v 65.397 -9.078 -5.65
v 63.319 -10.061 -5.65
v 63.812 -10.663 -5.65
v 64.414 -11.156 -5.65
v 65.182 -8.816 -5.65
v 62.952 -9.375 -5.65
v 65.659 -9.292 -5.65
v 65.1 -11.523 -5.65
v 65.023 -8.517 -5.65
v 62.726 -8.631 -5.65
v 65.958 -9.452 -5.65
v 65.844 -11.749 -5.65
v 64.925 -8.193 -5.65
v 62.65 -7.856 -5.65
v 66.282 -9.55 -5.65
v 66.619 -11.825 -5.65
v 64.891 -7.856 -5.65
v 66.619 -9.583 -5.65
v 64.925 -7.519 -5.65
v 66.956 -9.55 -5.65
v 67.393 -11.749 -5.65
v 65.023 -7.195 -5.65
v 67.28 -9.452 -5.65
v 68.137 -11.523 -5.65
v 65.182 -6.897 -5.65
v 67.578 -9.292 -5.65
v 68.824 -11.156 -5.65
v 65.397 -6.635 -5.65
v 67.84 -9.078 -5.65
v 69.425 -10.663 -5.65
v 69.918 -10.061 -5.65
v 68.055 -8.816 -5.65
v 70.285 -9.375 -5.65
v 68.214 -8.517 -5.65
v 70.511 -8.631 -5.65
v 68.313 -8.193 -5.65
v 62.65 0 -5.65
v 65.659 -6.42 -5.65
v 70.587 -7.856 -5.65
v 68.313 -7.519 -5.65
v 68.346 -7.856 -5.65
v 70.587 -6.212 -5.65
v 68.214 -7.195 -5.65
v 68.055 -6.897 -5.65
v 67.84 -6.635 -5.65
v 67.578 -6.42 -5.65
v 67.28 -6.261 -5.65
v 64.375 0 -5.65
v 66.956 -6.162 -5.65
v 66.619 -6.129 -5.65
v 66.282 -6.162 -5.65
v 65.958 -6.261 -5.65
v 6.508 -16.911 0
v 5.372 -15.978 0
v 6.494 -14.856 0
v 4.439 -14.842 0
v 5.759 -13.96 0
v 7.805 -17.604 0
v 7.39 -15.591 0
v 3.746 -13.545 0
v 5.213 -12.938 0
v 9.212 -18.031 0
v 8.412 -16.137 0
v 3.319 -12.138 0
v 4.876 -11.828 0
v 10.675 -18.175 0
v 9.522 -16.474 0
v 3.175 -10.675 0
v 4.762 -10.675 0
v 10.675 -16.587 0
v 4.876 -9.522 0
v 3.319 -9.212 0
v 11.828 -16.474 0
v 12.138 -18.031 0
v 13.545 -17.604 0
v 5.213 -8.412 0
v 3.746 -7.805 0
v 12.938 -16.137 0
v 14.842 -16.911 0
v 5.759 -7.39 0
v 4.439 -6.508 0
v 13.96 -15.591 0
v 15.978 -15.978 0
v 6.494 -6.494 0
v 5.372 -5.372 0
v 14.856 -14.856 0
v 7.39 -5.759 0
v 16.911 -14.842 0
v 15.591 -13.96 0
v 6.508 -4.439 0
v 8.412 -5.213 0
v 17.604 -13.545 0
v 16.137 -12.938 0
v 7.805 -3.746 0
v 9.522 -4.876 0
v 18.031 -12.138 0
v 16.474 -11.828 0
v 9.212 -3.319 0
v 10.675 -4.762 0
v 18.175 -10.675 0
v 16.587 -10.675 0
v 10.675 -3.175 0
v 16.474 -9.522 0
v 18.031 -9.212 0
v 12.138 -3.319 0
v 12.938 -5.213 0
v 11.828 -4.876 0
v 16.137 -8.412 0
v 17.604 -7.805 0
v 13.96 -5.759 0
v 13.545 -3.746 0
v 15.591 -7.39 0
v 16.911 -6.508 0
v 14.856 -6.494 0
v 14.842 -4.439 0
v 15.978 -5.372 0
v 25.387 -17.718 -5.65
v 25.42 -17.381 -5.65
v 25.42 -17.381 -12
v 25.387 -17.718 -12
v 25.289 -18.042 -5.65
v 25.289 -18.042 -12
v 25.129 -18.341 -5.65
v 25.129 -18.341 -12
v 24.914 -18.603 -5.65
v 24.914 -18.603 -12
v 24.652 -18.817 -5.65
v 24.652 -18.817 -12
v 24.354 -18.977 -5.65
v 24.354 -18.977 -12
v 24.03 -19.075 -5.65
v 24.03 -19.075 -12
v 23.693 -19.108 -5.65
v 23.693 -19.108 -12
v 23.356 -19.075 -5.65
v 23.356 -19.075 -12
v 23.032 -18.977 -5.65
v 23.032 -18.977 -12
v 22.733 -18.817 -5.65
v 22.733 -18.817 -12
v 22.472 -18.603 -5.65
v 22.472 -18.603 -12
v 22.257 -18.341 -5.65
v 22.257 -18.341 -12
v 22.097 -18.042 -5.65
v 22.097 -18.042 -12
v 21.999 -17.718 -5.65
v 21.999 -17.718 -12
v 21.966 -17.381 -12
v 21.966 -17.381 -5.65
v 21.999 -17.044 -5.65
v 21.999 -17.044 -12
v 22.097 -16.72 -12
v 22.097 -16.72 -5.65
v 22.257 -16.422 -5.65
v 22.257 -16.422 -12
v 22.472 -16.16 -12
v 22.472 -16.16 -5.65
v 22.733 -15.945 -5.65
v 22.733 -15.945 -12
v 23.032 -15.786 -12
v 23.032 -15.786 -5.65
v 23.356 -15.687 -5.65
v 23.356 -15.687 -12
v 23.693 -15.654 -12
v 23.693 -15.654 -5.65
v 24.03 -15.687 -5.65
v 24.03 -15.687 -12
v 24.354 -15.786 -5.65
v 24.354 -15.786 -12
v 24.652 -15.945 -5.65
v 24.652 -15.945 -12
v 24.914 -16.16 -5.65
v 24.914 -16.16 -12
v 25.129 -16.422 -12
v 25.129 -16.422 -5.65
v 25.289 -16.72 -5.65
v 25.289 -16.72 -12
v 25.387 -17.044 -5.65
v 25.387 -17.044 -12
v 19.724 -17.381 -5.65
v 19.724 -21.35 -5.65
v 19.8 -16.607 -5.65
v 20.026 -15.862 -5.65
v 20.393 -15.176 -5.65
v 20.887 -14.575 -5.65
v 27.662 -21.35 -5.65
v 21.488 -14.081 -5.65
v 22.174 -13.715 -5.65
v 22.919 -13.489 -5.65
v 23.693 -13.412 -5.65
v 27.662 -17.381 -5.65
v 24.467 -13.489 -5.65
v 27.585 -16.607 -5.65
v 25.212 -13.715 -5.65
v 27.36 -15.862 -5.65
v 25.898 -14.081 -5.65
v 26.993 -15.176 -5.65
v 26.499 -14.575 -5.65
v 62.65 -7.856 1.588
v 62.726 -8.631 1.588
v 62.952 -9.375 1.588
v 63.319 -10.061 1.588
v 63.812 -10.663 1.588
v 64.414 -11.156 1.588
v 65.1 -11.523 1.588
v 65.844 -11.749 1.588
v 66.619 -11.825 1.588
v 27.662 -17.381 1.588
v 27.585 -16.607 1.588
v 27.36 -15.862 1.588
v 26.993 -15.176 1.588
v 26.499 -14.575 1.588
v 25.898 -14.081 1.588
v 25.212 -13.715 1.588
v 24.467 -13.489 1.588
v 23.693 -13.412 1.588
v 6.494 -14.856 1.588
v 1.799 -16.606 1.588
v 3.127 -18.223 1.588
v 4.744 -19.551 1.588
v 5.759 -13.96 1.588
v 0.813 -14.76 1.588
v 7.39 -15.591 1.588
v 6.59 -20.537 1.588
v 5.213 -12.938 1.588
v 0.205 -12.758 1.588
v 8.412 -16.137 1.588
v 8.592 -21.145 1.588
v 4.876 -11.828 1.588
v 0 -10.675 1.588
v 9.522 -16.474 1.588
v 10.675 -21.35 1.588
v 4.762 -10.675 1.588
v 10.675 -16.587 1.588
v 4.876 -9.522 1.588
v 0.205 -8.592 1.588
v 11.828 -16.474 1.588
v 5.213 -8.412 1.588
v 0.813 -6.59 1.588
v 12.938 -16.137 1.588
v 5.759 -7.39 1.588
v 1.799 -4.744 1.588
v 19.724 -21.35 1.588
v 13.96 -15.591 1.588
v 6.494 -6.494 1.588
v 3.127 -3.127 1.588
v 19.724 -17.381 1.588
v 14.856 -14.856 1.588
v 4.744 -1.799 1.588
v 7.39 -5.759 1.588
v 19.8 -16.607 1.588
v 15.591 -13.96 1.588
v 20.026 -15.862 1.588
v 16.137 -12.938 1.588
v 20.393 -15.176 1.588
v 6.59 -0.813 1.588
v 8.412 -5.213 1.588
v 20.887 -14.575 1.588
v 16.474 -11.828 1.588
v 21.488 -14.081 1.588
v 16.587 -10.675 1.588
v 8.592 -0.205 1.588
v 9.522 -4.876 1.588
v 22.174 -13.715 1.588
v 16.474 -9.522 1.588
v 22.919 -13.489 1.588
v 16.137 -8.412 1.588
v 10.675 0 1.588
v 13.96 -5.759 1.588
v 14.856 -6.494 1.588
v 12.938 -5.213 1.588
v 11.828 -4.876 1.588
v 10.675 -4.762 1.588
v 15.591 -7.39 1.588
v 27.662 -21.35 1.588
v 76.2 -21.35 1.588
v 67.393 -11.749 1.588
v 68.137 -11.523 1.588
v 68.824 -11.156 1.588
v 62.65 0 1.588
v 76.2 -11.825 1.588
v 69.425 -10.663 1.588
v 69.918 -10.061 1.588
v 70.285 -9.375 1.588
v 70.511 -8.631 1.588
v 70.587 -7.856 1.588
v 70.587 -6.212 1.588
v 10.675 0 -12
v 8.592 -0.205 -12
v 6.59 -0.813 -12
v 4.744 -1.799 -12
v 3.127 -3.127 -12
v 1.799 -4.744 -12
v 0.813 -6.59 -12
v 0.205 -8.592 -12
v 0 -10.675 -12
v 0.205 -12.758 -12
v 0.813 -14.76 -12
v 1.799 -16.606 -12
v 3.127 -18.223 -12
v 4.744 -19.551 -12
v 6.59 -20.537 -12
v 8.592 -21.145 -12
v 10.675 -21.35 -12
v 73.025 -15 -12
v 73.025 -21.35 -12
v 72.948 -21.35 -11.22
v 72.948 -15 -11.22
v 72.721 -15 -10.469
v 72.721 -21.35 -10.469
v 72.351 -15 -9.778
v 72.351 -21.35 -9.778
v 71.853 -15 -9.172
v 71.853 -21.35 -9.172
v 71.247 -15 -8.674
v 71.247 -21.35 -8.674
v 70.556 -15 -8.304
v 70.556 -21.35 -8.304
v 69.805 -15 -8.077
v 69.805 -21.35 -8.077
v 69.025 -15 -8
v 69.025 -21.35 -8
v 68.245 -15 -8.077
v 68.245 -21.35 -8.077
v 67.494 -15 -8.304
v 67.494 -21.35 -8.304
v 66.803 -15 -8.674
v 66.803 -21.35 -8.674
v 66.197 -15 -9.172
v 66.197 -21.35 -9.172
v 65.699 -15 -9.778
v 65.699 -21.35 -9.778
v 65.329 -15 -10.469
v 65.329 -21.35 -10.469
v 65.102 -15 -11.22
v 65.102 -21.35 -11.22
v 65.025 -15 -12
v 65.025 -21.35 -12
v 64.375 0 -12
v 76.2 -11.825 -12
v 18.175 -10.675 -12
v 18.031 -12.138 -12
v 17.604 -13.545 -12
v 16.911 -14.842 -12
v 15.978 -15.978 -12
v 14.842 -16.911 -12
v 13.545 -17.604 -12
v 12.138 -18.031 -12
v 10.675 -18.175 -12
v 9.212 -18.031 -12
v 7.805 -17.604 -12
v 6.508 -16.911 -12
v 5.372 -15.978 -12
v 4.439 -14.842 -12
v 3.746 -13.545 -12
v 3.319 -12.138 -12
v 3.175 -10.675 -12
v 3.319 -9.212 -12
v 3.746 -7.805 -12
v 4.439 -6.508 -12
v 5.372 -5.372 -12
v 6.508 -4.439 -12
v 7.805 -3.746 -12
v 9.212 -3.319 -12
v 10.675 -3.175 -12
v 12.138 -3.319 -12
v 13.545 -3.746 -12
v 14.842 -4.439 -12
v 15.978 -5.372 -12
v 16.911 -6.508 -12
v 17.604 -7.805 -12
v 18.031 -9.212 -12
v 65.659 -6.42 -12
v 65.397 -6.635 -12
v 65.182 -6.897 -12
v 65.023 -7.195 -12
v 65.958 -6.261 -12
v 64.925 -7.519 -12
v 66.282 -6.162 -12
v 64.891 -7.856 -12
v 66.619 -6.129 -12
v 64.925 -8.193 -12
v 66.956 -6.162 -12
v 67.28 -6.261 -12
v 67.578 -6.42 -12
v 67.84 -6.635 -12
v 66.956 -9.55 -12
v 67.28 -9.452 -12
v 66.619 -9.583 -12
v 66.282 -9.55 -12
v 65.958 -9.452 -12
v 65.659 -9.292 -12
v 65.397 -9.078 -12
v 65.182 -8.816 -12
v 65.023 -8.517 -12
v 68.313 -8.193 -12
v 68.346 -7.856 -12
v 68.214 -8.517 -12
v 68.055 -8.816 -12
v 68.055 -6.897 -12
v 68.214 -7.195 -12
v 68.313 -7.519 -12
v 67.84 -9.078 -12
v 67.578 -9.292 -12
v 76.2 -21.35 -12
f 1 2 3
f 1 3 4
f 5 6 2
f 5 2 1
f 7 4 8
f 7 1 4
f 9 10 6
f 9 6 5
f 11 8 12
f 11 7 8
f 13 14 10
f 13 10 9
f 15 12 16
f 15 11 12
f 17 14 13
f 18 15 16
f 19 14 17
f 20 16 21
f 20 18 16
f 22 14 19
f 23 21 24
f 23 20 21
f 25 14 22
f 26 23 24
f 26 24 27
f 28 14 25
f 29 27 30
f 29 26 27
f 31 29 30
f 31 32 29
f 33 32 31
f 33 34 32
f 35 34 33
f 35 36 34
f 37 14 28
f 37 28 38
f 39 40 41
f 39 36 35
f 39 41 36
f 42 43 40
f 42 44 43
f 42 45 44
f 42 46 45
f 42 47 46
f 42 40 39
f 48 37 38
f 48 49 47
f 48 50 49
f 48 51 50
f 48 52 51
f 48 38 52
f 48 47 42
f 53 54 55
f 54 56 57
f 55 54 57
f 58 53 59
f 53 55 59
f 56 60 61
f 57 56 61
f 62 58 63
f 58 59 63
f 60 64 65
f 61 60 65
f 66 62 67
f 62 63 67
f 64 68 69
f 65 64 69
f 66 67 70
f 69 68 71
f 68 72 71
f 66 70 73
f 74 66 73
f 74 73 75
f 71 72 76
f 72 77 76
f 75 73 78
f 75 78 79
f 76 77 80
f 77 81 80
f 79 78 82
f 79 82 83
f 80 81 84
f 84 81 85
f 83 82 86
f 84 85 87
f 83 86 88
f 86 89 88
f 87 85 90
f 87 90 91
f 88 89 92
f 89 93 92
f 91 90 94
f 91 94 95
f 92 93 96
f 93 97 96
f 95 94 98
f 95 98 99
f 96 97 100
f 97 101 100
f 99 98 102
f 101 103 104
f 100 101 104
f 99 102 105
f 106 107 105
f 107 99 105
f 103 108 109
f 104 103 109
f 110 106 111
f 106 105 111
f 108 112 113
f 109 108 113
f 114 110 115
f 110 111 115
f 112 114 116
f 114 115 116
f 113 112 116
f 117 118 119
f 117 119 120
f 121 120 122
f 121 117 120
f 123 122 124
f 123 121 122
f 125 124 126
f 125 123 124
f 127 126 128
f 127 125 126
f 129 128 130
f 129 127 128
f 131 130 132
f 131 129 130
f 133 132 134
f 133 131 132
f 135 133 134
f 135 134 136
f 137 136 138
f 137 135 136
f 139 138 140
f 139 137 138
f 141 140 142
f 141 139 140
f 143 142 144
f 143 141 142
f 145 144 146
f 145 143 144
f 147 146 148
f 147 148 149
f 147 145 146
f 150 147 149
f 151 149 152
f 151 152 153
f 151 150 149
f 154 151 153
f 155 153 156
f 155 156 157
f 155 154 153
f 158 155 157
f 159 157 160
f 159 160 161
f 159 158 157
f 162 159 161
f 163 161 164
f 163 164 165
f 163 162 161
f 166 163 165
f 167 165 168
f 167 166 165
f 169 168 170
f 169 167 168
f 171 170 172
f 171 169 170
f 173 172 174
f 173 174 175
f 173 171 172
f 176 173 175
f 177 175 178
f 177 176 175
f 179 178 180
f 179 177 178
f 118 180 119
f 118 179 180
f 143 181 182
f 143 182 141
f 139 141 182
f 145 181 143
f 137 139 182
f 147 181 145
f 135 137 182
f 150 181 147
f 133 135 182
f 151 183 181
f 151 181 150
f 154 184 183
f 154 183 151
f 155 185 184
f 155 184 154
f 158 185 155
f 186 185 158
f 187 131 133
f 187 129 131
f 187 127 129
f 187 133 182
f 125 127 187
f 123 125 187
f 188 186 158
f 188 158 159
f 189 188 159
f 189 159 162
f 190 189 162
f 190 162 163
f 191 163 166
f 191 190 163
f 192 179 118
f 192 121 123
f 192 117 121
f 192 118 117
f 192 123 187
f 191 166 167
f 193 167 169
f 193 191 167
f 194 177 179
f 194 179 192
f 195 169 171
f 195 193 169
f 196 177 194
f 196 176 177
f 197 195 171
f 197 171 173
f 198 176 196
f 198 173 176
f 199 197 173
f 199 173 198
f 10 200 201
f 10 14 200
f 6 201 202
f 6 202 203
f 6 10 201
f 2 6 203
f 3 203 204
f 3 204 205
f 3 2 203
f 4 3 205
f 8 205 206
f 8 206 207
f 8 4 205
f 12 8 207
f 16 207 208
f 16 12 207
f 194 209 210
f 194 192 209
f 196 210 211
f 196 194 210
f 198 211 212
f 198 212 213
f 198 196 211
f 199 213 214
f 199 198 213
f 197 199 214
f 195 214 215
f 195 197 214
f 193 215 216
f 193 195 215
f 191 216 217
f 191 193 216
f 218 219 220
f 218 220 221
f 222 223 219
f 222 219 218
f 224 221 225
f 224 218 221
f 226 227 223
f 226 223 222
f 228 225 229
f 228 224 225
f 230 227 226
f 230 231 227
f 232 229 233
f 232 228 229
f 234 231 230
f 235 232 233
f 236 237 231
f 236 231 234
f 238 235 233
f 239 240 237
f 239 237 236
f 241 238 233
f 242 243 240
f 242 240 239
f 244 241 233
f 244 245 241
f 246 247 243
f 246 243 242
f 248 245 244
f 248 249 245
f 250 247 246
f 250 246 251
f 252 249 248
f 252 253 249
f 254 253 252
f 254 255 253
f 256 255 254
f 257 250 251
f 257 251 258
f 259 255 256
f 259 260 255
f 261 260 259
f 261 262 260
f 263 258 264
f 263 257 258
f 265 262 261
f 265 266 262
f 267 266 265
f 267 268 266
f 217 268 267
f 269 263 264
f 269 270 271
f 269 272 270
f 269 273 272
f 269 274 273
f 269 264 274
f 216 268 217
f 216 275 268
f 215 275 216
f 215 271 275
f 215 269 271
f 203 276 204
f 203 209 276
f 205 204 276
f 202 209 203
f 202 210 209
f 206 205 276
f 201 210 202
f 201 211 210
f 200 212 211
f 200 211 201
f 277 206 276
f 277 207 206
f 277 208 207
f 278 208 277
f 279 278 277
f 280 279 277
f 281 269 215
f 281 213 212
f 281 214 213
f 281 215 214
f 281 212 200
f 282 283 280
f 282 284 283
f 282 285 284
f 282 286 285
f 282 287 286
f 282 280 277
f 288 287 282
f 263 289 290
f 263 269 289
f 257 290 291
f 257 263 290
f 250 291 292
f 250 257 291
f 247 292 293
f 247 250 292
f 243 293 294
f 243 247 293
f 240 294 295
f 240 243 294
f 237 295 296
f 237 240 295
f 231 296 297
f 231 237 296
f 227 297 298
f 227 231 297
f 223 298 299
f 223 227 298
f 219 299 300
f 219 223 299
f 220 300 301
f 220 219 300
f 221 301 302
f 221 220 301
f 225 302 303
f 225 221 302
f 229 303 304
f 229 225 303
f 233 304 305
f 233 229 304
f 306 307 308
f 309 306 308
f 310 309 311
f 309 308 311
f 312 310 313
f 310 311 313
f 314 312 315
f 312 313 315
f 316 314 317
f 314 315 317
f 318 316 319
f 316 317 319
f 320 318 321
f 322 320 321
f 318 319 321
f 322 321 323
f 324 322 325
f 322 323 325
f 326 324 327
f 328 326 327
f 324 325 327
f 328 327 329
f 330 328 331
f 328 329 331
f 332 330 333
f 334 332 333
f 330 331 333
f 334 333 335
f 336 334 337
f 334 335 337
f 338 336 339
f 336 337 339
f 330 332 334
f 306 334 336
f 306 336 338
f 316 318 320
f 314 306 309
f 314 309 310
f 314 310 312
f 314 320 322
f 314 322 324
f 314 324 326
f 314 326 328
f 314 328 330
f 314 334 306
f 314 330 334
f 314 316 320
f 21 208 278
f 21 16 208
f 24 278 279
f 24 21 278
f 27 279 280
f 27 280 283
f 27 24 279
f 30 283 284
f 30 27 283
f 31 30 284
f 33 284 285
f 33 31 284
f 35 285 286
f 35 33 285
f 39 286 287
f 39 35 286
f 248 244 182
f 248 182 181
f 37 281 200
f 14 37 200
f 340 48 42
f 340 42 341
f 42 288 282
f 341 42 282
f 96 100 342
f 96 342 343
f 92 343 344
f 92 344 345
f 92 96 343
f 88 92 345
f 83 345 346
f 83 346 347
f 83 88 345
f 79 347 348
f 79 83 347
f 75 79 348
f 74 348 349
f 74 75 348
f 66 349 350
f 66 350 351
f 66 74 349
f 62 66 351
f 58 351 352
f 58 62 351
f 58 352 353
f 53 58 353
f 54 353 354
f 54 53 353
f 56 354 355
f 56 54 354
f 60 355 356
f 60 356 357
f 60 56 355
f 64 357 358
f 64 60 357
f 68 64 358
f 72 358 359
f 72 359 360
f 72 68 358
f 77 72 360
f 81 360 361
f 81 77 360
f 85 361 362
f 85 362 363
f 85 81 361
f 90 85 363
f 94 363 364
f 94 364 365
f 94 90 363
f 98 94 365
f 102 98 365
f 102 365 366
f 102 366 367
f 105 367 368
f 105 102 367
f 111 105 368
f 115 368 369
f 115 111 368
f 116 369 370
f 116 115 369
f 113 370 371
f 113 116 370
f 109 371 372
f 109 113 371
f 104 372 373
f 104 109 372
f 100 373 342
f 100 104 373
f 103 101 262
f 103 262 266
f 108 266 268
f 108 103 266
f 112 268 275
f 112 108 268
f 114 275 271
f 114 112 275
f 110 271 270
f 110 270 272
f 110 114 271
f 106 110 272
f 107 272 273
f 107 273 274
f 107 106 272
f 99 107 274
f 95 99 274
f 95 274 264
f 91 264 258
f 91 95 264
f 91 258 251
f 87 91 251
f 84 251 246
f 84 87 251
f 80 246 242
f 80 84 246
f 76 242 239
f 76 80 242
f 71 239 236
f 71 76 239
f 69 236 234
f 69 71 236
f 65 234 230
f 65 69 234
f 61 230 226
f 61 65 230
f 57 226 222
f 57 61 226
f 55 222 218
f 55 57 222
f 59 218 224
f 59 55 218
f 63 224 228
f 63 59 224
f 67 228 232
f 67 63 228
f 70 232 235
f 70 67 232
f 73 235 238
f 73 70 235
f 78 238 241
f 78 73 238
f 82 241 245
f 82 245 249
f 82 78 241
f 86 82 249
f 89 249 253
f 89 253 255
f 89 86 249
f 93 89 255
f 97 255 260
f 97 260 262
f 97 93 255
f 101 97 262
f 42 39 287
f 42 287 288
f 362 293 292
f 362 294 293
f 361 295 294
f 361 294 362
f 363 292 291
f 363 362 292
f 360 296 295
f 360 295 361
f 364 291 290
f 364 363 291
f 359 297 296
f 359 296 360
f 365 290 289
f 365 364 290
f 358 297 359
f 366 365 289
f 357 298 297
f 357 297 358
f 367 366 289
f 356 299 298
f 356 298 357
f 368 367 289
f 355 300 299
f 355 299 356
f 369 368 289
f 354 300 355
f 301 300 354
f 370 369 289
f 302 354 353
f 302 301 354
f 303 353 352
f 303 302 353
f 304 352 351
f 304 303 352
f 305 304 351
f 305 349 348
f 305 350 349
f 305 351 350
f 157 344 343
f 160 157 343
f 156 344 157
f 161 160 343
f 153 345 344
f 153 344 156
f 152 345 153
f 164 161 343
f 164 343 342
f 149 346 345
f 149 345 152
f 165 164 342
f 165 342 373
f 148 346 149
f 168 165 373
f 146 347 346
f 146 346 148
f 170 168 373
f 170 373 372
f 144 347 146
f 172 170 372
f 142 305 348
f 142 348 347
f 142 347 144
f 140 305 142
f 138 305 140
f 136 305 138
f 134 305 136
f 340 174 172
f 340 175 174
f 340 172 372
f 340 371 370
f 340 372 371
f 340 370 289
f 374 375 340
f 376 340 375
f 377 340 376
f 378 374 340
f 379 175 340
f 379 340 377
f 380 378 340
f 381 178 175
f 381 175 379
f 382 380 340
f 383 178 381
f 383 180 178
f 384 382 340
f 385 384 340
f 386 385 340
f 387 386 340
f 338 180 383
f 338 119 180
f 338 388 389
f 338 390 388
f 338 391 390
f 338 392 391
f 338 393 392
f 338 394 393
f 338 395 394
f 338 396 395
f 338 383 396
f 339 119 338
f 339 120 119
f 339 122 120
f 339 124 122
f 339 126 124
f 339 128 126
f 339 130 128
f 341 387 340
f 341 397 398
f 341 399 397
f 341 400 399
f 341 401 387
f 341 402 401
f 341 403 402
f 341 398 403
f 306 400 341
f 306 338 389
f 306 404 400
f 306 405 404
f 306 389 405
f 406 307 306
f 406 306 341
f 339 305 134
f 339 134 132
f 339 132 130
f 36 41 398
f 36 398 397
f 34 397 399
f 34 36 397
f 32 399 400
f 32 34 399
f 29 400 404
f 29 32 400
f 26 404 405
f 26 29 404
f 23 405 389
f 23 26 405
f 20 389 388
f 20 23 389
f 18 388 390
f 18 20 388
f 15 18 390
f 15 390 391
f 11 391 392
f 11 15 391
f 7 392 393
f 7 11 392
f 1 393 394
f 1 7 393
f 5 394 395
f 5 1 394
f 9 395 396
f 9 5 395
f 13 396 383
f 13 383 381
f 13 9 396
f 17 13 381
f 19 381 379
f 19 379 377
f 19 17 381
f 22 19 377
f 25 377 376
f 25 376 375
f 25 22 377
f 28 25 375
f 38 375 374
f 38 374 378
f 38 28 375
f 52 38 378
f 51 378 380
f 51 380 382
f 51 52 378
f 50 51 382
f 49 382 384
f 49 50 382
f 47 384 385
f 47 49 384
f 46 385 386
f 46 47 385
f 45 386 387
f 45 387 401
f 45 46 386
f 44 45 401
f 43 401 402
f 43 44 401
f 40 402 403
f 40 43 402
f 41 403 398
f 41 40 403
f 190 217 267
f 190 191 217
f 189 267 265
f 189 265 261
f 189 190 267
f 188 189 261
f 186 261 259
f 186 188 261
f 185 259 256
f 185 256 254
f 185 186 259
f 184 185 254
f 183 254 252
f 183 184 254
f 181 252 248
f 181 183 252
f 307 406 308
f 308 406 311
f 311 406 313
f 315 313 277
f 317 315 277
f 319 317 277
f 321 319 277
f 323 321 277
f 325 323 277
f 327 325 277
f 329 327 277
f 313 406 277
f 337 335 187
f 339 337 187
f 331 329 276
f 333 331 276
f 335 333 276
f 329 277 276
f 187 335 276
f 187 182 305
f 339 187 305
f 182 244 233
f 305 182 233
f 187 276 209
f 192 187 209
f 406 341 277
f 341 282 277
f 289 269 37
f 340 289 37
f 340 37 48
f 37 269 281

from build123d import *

# Parameters (mm, degrees)
F0_R     = 1.7272
F0_R_2   = 5.9124977
F1_DEPTH = 1.5875
F2_R     = 1.7272
F2_R_2   = 7.5
F3_DEPTH = 12
F5_DEPTH = 6.35
F6_R     = 10.674988
F7_W     = 7.9375
F7_H     = 7.9375
F8_DEPTH = 7.2375014
F9_R     = 3.96874


# Not quite as in the source:
# - a fillet or chamfer is up to 0.001 mm smaller than in the source, because OpenCascade refuses the exact size


with BuildPart() as f1:
    # F0 (on Top) → F1 (new body)
    with BuildSketch(Plane.XY):
        Polygon((64.3750046, 0), (0, 0), (0, -21.3499954), (76.2, -21.3499954), (76.2, -11.8249954), align=None)
        with Locations((23.692892633, -17.3812454)):
            Circle(F0_R, mode=Mode.SUBTRACT)
        with Locations((10.6749977, -10.6749977)):
            Circle(F0_R_2, mode=Mode.SUBTRACT)
        with Locations((66.6185899243, -7.8562454)):
            Circle(F0_R, mode=Mode.SUBTRACT)
    extrude(amount=F1_DEPTH)

    # F2 (on face) → F3 (join)
    with BuildSketch(Plane(origin=(0, 0, 0), x_dir=(1, 0, 0), z_dir=(0, 0, -1))):
        Polygon((0, 0), (64.3750046, 0), (76.2, 11.8249954), (76.2, 21.3499954), (0, 21.3499954), align=None)
        with Locations((66.6185899243, 7.8562454)):
            Circle(F2_R, mode=Mode.SUBTRACT)
        with Locations((10.6749977, 10.6749977)):
            Circle(F2_R_2, mode=Mode.SUBTRACT)
        with Locations((23.692892633, 17.3812454)):
            Circle(F2_R, mode=Mode.SUBTRACT)
    extrude(amount=F3_DEPTH)

    # F4 (on face) → F5 (cut)
    with BuildSketch(Plane.XZ.offset(21.3499954)):
        with BuildLine():
            Line((65.025, -12), (73.025, -12))
            ThreePointArc((73.025, -12), (69.025, -8), (65.025, -12))
        make_face()
    extrude(amount=-F5_DEPTH, mode=Mode.SUBTRACT)

    # F6 (radius 10.6749977 in the source; OpenCascade refuses exactly that, so slightly less here)
    f6_edges = [f1.edges().sort_by_distance(p)[0] for p in [
        (0, -21.349995, -5.20625),
        (0, 0, -5.20625),
    ]]
    fillet(f6_edges, radius=F6_R)

    # F7 (on face) → F8 (cut)
    with BuildSketch(Plane.XY.offset(1.5875)):
        with Locations((23.692892633, -17.3812454)):
            Rectangle(F7_W, F7_H)
        Polygon((64.3750046, 0), (62.6498399243, 0), (62.6498399243, -11.8249954), (70.5873399243, -11.8249954), (70.5873399243, -6.2123353243), align=None)
    extrude(amount=-F8_DEPTH, mode=Mode.SUBTRACT)

    # F9 (radius 3.96875 in the source; OpenCascade refuses exactly that, so slightly less here)
    f9_edges = [f1.edges().sort_by_distance(p)[0] for p in [
        (27.661643, -13.412495, -2.031251),
        (19.724143, -13.412495, -2.031251),
        (62.64984, -11.824995, -2.031251),
        (70.58734, -11.824995, -2.031251),
    ]]
    fillet(f9_edges, radius=F9_R)


solid = f1.part
